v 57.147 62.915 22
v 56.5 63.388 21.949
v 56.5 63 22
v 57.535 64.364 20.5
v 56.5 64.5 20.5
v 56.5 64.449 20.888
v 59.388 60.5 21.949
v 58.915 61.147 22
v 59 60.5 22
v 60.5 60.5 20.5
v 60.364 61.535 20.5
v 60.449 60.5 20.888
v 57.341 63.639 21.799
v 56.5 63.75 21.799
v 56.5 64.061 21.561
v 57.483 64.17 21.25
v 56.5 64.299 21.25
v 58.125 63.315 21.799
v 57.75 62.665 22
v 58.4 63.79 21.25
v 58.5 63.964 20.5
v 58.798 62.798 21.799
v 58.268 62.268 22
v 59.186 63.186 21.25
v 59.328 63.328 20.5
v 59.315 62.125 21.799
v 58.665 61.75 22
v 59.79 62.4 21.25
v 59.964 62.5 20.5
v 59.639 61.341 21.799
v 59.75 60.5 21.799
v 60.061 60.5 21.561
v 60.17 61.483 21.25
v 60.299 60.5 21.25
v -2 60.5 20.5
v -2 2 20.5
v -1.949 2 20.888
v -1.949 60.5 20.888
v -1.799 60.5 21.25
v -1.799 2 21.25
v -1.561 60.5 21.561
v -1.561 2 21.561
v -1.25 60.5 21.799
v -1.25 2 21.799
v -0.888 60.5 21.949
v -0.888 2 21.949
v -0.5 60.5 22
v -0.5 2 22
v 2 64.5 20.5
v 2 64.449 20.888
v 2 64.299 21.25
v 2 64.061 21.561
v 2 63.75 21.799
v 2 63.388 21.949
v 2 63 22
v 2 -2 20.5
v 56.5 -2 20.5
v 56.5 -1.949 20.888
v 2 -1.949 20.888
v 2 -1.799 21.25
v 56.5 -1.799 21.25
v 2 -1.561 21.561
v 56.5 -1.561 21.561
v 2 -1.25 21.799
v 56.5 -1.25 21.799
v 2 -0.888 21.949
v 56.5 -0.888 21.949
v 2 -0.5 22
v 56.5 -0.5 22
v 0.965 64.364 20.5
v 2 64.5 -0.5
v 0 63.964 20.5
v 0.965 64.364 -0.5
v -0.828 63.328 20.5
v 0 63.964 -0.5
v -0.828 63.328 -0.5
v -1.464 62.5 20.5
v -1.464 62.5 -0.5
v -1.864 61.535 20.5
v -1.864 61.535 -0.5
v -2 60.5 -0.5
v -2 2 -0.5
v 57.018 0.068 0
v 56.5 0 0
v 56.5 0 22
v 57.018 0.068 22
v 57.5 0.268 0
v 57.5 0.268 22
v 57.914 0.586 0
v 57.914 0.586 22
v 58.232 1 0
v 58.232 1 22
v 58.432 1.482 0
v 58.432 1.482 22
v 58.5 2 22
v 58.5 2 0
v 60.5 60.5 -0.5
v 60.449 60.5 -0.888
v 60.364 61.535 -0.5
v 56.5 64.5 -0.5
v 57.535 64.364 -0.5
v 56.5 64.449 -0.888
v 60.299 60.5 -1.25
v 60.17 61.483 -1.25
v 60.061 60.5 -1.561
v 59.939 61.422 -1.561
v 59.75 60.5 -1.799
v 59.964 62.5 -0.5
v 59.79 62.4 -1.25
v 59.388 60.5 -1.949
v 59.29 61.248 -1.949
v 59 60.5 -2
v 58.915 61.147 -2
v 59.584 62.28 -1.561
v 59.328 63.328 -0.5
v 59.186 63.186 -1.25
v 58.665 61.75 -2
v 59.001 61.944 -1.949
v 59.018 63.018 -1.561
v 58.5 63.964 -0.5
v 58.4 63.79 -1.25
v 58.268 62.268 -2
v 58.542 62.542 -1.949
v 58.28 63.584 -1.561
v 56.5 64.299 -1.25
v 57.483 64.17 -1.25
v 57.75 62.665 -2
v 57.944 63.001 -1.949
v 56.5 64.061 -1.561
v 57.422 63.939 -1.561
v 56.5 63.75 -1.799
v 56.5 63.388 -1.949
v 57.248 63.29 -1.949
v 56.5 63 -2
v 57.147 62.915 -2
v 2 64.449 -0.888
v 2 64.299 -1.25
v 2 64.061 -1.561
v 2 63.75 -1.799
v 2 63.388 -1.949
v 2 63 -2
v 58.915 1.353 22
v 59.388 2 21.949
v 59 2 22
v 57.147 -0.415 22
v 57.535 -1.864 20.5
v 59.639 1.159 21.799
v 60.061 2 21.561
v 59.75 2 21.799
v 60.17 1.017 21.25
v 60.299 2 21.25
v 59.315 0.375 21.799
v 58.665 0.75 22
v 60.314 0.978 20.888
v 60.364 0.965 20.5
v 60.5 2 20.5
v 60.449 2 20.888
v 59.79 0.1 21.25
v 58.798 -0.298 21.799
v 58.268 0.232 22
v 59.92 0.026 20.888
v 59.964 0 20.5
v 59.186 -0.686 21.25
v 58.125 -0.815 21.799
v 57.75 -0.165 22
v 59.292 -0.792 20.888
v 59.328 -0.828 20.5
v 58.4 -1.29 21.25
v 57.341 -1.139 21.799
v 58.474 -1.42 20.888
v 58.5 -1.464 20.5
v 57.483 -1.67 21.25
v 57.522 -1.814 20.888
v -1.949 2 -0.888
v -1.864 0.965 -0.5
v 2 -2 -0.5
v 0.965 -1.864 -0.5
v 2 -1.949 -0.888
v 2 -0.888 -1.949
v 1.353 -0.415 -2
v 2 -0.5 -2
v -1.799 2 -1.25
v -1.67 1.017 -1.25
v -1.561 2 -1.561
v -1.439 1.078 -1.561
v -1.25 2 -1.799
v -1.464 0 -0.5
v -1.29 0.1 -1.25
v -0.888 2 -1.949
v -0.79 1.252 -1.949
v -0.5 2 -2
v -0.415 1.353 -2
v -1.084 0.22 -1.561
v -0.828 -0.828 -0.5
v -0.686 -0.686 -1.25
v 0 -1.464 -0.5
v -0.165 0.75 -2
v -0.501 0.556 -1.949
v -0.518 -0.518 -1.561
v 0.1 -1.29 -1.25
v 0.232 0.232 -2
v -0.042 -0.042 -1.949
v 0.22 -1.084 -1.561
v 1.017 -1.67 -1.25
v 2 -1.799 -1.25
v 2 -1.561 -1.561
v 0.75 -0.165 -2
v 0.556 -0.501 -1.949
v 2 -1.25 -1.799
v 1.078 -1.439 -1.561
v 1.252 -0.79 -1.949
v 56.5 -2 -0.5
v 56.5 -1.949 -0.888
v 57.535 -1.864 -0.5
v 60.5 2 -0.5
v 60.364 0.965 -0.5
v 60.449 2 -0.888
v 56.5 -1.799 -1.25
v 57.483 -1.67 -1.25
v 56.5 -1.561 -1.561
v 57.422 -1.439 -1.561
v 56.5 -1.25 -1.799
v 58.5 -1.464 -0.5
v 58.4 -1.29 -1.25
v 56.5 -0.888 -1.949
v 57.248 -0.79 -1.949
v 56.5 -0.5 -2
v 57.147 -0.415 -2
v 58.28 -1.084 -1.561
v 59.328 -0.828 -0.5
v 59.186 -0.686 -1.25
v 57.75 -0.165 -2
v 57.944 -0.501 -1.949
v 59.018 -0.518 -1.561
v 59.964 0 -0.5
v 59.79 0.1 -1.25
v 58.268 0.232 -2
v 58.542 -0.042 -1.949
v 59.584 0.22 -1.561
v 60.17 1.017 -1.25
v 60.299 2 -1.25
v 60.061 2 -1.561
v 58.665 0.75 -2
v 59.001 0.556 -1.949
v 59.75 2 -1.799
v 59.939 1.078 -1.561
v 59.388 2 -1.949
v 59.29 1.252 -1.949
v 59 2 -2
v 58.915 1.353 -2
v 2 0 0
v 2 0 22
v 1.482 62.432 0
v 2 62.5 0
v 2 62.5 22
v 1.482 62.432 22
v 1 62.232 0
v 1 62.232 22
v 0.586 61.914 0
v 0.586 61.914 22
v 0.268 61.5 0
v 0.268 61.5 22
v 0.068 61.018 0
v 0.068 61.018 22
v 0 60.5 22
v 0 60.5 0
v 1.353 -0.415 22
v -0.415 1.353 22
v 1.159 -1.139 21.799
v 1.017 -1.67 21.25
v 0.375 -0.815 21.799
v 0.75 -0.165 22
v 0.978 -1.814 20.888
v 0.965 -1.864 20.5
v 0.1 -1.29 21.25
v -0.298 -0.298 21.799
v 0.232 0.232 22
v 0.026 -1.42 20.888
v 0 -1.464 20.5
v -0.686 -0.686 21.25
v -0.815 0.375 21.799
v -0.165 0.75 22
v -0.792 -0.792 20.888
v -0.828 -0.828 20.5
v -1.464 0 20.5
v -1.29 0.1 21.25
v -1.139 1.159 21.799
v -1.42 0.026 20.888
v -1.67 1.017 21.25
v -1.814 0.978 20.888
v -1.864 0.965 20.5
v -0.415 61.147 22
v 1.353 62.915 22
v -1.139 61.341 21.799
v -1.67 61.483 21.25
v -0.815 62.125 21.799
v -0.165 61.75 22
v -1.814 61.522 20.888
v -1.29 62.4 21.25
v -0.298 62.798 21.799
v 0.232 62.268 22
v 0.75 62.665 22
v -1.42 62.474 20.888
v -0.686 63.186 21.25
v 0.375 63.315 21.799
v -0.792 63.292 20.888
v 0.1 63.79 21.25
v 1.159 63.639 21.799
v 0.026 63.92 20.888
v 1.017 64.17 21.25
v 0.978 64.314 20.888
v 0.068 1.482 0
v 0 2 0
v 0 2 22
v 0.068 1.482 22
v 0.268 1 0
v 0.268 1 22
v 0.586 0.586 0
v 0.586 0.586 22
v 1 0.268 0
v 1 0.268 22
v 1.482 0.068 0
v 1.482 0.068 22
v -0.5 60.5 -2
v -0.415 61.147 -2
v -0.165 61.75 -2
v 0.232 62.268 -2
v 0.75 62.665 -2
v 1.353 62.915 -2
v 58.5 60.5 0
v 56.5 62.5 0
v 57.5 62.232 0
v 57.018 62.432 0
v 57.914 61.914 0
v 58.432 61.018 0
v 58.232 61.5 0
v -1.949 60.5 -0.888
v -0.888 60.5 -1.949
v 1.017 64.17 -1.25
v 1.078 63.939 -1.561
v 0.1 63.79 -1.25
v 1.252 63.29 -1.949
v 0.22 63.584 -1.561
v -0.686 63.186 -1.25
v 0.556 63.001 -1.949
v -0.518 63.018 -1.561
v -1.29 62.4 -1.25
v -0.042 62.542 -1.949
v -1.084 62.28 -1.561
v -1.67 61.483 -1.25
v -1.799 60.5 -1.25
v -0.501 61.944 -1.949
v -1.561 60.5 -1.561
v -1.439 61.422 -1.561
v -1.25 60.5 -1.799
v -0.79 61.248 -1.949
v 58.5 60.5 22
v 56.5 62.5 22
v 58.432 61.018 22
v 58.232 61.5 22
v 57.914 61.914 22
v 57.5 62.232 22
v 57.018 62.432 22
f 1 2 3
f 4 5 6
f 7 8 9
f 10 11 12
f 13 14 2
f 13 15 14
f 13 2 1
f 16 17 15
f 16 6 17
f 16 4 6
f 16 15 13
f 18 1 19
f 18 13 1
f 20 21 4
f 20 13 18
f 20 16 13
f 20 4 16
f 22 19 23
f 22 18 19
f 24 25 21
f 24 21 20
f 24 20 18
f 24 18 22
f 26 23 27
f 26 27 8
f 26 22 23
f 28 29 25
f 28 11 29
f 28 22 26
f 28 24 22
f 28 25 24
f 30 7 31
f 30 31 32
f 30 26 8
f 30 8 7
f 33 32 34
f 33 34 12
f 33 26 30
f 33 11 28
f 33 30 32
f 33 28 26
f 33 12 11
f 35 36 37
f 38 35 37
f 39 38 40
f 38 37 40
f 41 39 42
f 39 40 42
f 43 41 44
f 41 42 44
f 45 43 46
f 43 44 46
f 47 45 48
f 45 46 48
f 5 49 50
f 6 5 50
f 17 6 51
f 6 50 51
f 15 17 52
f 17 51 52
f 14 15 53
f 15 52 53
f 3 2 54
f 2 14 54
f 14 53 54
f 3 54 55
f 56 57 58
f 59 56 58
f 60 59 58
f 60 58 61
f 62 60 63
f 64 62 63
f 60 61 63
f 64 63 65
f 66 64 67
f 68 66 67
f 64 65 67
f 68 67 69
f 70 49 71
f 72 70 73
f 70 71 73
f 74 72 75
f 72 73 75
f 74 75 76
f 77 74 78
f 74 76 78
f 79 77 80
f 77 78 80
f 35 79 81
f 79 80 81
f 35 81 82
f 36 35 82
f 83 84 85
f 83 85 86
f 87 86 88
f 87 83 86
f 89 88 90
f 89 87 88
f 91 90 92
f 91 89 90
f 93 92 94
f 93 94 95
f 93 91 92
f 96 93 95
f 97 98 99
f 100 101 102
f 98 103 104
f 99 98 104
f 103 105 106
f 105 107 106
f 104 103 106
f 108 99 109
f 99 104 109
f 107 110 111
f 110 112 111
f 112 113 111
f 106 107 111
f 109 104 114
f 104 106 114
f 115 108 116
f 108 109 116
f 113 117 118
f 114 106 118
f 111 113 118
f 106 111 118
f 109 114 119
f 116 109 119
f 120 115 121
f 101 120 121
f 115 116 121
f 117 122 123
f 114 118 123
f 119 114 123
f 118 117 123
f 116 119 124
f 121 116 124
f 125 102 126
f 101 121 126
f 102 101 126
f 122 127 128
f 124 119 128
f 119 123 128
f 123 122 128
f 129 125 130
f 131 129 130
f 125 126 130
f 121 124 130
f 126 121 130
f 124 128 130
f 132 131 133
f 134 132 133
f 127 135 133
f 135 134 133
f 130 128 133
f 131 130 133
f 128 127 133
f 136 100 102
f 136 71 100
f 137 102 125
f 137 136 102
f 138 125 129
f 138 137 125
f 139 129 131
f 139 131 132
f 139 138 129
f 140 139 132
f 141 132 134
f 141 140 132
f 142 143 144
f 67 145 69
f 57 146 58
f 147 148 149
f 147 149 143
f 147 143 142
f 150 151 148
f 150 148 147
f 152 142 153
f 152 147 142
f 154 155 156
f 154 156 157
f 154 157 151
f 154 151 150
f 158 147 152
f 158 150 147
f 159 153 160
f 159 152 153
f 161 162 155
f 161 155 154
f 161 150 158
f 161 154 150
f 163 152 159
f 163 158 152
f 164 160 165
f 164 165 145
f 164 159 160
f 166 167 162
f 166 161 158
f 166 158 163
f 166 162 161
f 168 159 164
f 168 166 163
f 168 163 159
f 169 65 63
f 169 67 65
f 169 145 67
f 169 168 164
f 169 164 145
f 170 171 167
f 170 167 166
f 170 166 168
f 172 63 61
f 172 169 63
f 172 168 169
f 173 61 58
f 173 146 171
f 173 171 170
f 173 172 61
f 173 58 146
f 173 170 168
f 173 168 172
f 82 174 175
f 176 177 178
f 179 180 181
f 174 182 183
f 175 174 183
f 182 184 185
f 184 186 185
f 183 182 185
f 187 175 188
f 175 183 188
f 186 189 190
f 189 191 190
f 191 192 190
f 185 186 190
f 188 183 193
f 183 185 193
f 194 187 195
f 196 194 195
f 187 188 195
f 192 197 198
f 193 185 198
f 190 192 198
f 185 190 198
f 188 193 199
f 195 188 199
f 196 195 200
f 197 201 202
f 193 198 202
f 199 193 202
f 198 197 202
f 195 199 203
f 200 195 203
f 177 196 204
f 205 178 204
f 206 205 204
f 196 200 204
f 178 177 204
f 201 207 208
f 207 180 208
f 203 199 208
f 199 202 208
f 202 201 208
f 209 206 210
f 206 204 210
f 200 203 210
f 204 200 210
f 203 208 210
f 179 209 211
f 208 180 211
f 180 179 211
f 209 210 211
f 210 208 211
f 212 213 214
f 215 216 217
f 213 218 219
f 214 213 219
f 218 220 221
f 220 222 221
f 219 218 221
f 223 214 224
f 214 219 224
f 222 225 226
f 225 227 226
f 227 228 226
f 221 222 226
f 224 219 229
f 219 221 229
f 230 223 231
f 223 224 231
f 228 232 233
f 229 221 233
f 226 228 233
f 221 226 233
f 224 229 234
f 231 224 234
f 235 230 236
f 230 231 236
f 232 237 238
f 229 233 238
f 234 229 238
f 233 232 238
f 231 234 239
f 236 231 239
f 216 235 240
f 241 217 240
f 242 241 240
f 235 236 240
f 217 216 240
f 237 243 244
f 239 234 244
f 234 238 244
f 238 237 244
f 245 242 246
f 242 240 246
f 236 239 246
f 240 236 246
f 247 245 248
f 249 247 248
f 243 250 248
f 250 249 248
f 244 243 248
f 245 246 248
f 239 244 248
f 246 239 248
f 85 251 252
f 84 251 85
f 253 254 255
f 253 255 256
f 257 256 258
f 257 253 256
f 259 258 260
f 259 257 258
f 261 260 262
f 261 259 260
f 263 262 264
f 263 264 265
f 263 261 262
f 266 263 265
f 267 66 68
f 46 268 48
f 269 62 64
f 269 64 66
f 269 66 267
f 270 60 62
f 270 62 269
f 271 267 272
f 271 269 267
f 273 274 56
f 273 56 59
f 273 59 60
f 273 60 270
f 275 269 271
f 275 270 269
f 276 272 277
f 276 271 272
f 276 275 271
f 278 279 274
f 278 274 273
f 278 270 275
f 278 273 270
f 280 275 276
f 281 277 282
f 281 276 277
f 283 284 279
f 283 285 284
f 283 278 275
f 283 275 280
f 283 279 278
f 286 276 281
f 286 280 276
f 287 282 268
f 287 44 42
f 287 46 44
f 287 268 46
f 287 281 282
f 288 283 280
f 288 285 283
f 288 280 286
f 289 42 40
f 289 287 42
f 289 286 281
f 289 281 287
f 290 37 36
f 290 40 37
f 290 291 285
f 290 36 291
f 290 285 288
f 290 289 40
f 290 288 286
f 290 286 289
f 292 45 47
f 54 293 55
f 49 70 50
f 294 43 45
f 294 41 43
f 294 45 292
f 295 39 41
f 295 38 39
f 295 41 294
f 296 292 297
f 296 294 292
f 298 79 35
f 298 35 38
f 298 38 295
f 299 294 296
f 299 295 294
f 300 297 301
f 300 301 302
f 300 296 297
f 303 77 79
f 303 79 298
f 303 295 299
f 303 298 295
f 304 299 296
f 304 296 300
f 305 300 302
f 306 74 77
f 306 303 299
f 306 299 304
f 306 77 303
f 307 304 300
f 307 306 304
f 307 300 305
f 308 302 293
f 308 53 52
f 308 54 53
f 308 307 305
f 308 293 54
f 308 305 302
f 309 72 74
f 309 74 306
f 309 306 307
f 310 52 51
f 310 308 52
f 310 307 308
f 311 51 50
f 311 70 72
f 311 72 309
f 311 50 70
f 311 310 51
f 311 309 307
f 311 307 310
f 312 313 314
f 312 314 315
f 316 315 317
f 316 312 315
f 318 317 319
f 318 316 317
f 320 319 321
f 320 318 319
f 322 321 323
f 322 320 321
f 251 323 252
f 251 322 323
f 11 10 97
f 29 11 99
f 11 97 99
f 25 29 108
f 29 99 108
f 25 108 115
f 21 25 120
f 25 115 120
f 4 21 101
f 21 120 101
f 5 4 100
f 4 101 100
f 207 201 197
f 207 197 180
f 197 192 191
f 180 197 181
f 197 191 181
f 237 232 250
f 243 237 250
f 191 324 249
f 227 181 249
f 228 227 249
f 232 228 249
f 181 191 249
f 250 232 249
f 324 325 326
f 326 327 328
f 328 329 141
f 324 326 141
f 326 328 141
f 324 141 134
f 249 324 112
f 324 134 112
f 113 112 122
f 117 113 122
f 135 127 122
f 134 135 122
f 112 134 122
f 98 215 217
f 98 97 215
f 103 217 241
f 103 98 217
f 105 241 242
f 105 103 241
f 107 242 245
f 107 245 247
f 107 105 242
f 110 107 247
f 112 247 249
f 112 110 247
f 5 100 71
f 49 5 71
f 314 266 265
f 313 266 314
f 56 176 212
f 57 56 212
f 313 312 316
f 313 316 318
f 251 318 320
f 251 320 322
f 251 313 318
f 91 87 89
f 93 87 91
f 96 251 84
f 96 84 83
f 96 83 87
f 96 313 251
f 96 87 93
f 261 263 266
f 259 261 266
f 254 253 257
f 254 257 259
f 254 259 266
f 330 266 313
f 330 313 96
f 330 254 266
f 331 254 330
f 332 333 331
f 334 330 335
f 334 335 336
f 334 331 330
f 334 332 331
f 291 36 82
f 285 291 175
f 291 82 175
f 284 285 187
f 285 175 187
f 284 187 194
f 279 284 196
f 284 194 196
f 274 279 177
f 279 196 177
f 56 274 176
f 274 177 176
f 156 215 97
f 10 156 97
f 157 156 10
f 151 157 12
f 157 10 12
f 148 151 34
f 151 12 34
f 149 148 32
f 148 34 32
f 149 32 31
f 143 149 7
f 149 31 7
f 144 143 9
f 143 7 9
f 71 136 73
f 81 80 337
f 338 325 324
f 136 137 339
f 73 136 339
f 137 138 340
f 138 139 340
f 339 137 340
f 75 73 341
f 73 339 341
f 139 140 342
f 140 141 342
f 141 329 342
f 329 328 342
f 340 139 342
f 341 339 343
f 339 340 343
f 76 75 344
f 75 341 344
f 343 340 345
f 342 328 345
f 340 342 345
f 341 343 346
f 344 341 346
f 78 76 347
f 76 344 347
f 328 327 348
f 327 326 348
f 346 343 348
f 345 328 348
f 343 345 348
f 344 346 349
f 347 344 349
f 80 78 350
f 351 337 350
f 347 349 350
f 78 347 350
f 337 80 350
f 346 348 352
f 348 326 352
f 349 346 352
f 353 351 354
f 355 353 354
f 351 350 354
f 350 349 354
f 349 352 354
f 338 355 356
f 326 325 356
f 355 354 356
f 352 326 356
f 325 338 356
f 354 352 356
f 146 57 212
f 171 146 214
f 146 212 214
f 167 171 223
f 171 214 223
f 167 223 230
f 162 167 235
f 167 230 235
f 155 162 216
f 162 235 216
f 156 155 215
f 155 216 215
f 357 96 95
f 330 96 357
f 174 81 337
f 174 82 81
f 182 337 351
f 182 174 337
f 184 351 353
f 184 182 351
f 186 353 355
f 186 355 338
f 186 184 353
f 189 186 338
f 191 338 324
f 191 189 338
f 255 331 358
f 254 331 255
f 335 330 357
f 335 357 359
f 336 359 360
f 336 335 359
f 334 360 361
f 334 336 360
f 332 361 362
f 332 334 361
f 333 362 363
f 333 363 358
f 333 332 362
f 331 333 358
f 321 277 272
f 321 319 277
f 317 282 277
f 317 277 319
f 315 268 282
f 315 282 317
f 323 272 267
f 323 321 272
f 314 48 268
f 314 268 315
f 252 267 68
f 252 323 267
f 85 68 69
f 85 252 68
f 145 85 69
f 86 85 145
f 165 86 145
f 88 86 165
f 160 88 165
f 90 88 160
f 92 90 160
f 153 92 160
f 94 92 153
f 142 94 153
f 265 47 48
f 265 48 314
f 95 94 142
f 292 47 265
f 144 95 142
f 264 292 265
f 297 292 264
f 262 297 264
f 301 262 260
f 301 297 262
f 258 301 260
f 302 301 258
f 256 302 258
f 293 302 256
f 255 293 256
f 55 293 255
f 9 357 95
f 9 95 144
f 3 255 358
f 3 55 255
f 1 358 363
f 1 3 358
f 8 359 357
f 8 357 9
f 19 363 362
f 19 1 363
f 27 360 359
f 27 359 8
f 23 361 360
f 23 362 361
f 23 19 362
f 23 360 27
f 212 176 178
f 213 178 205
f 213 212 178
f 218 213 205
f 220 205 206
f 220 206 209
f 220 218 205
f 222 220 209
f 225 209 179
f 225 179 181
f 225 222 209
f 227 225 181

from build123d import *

# Parameters (mm, degrees)
BOSS_EXTRU_1_DEPTH = 22
COQUE1_T           = 2
CONG_1_R           = 1.5
CONG_2_R           = 1.5


with BuildPart() as part:
    # Esquisse1 → Boss.-Extru.1 (new body)
    with BuildSketch(Plane.XY):
        with BuildLine():
            Line((2, 0), (56.5, 0))
            ThreePointArc((56.5, 0), (57.914213562, 0.585786438), (58.5, 2))
            Line((58.5, 2), (58.5, 60.5))
            ThreePointArc((58.5, 60.5), (57.914213562, 61.914213562), (56.5, 62.5))
            Line((56.5, 62.5), (2, 62.5))
            ThreePointArc((2, 62.5), (0.585786438, 61.914213562), (0, 60.5))
            Line((0, 60.5), (0, 2))
            ThreePointArc((0, 2), (0.585786438, 0.585786438), (2, 0))
        make_face()
    extrude(amount=BOSS_EXTRU_1_DEPTH)

    # Coque1
    coque1_openings = [part.faces().sort_by_distance(p)[0] for p in [
        (29.25, 31.25, 22),
    ]]
    offset(amount=COQUE1_T, openings=coque1_openings, kind=Kind.INTERSECTION)

    # Congé1
    # the kernel refuses this fillet: 1.5 mm, written as the material it takes off along each edge
    with BuildSketch(Plane(origin=(56.5, 60.5, 22), x_dir=(0, 1, 0), z_dir=(-1, 0, 0))) as cong_1_piece_1:
        with BuildLine():
            CenterArc((4 - CONG_1_R, CONG_1_R), CONG_1_R, 270, 90)
            Line((4, CONG_1_R), (4, 0))
            Line((4, 0), (4 - CONG_1_R, 0))
        make_face()
    revolve(axis=Axis((56.5, 60.5, 22), (0, 0, -1)), revolution_arc=90, mode=Mode.SUBTRACT)
    with BuildSketch(Plane(origin=(2, 64.5, 22), x_dir=(0, -1, 0), z_dir=(1, 0, 0)), Plane(origin=(56.5, -2, 22), x_dir=(0, 1, 0), z_dir=(-1, 0, 0))) as cong_1_piece_2:
        with BuildLine():
            CenterArc((CONG_1_R, CONG_1_R), CONG_1_R, 180, 90)
            Line((0, CONG_1_R), (0, 0))
            Line((0, 0), (CONG_1_R, 0))
        make_face()
    extrude(amount=54.5, mode=Mode.SUBTRACT)
    with BuildSketch(Plane(origin=(2, 60.5, 22), x_dir=(-1, 0, 0), z_dir=(0, -1, 0))) as cong_1_piece_3:
        with BuildLine():
            CenterArc((4 - CONG_1_R, CONG_1_R), CONG_1_R, 270, 90)
            Line((4, CONG_1_R), (4, 0))
            Line((4, 0), (4 - CONG_1_R, 0))
        make_face()
    revolve(axis=Axis((2, 60.5, 22), (0, 0, -1)), revolution_arc=90, mode=Mode.SUBTRACT)
    with BuildSketch(Plane(origin=(-2, 2, 22), x_dir=(1, 0, 0), z_dir=(0, 1, 0)), Plane(origin=(60.5, 60.5, 22), x_dir=(-1, 0, 0), z_dir=(0, -1, 0))) as cong_1_piece_4:
        with BuildLine():
            CenterArc((CONG_1_R, CONG_1_R), CONG_1_R, 180, 90)
            Line((0, CONG_1_R), (0, 0))
            Line((0, 0), (CONG_1_R, 0))
        make_face()
    extrude(amount=58.5, mode=Mode.SUBTRACT)
    with BuildSketch(Plane(origin=(2, 2, 22), x_dir=(0, -1, 0), z_dir=(1, 0, 0))) as cong_1_piece_5:
        with BuildLine():
            CenterArc((4 - CONG_1_R, CONG_1_R), CONG_1_R, 270, 90)
            Line((4, CONG_1_R), (4, 0))
            Line((4, 0), (4 - CONG_1_R, 0))
        make_face()
    revolve(axis=Axis((2, 2, 22), (0, 0, -1)), revolution_arc=90, mode=Mode.SUBTRACT)
    with BuildSketch(Plane(origin=(56.5, 2, 22), x_dir=(1, 0, 0), z_dir=(0, 1, 0))) as cong_1_piece_6:
        with BuildLine():
            CenterArc((4 - CONG_1_R, CONG_1_R), CONG_1_R, 270, 90)
            Line((4, CONG_1_R), (4, 0))
            Line((4, 0), (4 - CONG_1_R, 0))
        make_face()
    revolve(axis=Axis((56.5, 2, 22), (0, 0, -1)), revolution_arc=90, mode=Mode.SUBTRACT)

    # Congé2
    cong_2_edges = [part.edges().sort_by_distance(p)[0] for p in [
        (29.25, 64.5, -2),
        (59.328427125, 63.328427125, -2),
        (60.5, 31.25, -2),
        (59.328427125, -0.828427125, -2),
        (29.25, -2, -2),
        (-0.828427125, -0.828427125, -2),
        (-2, 31.25, -2),
        (-0.828427125, 63.328427125, -2),
    ]]
    fillet(cong_2_edges, radius=CONG_2_R)


solid = part.part
